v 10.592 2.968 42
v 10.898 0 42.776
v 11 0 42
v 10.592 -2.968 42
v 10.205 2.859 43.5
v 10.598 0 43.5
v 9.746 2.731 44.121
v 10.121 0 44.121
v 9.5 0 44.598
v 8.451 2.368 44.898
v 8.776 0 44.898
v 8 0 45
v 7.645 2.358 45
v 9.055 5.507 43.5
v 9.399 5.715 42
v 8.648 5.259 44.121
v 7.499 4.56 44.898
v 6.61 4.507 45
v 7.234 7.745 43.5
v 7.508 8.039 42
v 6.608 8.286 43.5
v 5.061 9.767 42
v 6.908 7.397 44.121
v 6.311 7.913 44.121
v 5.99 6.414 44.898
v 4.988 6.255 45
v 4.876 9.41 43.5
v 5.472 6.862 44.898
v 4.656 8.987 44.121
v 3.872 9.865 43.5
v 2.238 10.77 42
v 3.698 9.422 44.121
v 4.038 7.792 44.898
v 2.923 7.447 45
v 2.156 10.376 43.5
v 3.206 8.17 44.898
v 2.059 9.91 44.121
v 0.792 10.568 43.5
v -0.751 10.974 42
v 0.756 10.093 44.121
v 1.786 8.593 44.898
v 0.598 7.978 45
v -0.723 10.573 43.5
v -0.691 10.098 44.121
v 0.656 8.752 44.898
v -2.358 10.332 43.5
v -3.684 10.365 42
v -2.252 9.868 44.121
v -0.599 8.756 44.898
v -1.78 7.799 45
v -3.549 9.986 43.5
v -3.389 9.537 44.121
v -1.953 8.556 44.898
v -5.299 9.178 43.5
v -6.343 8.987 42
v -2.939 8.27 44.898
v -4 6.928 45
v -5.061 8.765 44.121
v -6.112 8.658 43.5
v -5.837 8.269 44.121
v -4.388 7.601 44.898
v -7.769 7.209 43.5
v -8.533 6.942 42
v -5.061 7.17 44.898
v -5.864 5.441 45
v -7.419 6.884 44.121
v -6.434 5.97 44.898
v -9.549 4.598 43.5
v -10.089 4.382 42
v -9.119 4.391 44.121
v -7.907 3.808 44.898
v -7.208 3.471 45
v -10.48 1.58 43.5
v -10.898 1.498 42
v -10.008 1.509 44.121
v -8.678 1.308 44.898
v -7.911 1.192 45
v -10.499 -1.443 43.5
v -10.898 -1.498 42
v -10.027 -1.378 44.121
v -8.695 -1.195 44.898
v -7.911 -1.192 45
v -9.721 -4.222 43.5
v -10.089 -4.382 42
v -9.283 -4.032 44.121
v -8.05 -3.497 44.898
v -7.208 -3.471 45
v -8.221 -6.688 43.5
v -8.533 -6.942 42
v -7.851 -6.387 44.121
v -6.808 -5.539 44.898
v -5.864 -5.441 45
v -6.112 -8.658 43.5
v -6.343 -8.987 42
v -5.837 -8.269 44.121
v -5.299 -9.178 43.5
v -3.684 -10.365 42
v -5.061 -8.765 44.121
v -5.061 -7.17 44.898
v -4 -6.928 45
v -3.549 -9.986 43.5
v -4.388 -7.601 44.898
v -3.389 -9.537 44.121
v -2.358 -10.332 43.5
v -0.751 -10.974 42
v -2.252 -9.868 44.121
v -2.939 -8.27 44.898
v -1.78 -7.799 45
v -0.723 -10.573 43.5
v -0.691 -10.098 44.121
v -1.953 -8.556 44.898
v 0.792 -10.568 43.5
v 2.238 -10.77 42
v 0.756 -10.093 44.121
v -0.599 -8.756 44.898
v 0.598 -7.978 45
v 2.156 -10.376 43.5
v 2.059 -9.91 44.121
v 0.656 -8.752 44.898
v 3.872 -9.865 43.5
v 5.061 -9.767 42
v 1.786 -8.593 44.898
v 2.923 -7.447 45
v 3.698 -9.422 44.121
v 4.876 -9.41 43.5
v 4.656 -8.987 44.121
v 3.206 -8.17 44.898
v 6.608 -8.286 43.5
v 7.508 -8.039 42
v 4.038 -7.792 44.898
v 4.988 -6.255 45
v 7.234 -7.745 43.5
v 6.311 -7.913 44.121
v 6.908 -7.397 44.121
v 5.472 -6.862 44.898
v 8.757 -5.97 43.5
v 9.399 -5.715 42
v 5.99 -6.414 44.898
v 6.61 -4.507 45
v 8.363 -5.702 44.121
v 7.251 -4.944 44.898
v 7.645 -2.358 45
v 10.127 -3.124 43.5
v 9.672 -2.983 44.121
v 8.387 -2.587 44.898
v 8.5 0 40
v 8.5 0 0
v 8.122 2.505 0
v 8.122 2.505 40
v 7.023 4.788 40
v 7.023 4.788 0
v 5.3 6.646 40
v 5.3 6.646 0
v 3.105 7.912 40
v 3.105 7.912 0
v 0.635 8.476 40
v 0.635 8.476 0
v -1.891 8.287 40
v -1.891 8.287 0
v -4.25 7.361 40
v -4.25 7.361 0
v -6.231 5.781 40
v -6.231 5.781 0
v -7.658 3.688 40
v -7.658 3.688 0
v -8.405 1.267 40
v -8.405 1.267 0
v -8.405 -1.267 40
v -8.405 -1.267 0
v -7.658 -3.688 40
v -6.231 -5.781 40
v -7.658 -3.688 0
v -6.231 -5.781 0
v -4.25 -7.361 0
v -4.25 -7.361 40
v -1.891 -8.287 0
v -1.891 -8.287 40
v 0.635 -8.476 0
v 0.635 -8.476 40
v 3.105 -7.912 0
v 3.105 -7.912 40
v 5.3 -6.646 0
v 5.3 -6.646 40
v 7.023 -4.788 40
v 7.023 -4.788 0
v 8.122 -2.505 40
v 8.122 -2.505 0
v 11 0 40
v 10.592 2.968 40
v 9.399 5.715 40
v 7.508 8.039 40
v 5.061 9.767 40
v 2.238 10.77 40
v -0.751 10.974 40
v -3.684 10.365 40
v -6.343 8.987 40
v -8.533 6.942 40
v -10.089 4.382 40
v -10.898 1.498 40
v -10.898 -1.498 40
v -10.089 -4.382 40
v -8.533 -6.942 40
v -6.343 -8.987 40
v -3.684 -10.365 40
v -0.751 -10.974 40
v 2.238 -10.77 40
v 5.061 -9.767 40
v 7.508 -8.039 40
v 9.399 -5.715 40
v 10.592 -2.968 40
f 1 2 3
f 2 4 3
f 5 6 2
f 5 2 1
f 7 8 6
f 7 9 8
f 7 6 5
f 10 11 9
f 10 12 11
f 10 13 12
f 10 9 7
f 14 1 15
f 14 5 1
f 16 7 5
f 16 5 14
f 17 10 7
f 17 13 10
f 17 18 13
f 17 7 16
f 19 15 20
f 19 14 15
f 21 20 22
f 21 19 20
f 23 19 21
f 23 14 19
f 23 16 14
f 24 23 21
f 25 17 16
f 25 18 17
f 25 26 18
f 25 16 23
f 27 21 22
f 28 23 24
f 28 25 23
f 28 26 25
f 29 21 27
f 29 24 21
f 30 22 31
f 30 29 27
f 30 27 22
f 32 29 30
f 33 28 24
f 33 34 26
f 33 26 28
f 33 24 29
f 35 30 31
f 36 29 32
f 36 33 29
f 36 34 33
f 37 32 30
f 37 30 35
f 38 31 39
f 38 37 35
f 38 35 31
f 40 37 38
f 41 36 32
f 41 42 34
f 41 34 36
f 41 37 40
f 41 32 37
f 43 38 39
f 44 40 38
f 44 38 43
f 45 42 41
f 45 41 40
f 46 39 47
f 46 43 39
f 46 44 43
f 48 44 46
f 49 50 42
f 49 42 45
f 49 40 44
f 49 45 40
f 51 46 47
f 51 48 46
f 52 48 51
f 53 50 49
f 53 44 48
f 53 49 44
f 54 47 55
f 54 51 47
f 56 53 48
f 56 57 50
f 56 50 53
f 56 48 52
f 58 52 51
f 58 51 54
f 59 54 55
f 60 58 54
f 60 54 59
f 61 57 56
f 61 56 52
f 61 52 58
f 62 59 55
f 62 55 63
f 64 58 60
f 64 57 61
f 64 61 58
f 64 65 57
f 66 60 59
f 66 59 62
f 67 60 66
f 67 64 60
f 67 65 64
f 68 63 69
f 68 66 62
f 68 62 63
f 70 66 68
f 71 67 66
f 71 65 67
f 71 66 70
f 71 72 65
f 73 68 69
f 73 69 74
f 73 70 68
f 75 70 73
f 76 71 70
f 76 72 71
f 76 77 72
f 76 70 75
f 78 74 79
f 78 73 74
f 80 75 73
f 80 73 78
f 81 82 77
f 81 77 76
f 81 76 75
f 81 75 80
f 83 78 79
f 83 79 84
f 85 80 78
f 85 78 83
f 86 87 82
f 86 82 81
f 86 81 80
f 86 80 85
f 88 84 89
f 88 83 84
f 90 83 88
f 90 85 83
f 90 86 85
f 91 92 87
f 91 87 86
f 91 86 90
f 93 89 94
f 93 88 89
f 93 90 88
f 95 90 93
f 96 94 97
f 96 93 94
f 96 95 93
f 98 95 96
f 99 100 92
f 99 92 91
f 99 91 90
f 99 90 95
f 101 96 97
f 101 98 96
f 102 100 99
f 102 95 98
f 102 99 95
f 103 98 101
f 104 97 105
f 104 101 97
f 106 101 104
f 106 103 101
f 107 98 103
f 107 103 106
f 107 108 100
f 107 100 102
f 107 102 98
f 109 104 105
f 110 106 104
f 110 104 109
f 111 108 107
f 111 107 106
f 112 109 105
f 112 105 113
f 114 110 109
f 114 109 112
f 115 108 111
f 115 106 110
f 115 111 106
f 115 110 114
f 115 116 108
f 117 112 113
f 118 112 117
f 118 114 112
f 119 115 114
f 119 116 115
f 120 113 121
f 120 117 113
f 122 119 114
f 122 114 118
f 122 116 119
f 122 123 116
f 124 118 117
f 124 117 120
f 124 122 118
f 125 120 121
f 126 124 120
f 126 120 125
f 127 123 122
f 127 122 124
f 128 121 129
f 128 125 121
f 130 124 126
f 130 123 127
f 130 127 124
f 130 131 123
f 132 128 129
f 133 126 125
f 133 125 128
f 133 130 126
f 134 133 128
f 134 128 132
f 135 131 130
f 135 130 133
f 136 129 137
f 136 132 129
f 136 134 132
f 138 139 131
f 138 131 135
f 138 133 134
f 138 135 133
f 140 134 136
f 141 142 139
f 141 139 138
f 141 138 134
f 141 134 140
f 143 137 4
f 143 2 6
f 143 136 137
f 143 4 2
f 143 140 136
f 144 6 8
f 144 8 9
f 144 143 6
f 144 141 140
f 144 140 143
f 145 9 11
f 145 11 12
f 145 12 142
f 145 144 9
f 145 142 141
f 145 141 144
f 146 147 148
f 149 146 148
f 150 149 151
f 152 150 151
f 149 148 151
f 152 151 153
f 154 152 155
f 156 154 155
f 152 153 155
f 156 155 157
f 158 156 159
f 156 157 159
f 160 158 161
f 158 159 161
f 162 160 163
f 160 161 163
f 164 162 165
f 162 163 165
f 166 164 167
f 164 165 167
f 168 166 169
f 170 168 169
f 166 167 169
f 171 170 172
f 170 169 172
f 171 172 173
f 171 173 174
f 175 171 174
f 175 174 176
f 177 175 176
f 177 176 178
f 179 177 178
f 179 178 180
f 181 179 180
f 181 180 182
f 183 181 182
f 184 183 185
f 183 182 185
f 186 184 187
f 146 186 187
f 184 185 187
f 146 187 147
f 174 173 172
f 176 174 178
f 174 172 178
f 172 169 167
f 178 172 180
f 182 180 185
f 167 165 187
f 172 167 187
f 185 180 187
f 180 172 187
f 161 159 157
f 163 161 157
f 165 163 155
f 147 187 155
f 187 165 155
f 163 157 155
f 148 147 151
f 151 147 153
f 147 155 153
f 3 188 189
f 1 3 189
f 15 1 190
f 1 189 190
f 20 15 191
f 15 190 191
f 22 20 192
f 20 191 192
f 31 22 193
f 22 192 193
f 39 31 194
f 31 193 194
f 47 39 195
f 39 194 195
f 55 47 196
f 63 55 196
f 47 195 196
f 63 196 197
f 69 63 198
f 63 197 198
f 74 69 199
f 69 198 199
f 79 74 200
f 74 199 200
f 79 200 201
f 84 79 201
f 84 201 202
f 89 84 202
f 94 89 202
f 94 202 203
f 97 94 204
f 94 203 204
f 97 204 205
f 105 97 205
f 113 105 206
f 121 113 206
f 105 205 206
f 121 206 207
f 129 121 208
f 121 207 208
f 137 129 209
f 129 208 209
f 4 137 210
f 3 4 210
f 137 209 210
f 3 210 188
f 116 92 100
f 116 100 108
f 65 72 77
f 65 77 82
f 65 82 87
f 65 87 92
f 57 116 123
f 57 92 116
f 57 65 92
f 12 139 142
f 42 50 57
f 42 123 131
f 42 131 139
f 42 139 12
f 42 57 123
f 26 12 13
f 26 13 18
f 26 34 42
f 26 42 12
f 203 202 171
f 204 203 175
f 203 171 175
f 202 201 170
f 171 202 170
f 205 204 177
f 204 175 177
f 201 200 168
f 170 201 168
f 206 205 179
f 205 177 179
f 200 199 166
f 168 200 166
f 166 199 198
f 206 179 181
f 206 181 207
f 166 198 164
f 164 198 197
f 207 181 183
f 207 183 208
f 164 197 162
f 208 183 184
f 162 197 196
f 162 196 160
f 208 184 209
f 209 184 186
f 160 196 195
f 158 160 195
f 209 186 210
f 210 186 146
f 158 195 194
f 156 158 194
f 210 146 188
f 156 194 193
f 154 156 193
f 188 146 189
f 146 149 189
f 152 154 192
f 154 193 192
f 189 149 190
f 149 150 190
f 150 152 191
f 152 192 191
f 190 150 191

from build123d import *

# Parameters (mm, degrees)
SKETCH1_R           = 8.5
BOSS_EXTRUDE1_DEPTH = 40
SKETCH2_R           = 11
BOSS_EXTRUDE2_DEPTH = 5
FILLET1_R           = 3


with BuildPart() as part:
    # Sketch1 → Boss-Extrude1 (new body)
    with BuildSketch(Plane.XY):
        Circle(SKETCH1_R)
    extrude(amount=BOSS_EXTRUDE1_DEPTH)

    # Sketch2 → Boss-Extrude2 (add)
    with BuildSketch(Plane.XY.offset(40)):
        Circle(SKETCH2_R)
    extrude(amount=BOSS_EXTRUDE2_DEPTH)

    # Fillet1
    fillet1_edges = [part.edges().sort_by_distance(p)[0] for p in [
        (-11, 0, 45),
    ]]
    fillet(fillet1_edges, radius=FILLET1_R)


solid = part.part
